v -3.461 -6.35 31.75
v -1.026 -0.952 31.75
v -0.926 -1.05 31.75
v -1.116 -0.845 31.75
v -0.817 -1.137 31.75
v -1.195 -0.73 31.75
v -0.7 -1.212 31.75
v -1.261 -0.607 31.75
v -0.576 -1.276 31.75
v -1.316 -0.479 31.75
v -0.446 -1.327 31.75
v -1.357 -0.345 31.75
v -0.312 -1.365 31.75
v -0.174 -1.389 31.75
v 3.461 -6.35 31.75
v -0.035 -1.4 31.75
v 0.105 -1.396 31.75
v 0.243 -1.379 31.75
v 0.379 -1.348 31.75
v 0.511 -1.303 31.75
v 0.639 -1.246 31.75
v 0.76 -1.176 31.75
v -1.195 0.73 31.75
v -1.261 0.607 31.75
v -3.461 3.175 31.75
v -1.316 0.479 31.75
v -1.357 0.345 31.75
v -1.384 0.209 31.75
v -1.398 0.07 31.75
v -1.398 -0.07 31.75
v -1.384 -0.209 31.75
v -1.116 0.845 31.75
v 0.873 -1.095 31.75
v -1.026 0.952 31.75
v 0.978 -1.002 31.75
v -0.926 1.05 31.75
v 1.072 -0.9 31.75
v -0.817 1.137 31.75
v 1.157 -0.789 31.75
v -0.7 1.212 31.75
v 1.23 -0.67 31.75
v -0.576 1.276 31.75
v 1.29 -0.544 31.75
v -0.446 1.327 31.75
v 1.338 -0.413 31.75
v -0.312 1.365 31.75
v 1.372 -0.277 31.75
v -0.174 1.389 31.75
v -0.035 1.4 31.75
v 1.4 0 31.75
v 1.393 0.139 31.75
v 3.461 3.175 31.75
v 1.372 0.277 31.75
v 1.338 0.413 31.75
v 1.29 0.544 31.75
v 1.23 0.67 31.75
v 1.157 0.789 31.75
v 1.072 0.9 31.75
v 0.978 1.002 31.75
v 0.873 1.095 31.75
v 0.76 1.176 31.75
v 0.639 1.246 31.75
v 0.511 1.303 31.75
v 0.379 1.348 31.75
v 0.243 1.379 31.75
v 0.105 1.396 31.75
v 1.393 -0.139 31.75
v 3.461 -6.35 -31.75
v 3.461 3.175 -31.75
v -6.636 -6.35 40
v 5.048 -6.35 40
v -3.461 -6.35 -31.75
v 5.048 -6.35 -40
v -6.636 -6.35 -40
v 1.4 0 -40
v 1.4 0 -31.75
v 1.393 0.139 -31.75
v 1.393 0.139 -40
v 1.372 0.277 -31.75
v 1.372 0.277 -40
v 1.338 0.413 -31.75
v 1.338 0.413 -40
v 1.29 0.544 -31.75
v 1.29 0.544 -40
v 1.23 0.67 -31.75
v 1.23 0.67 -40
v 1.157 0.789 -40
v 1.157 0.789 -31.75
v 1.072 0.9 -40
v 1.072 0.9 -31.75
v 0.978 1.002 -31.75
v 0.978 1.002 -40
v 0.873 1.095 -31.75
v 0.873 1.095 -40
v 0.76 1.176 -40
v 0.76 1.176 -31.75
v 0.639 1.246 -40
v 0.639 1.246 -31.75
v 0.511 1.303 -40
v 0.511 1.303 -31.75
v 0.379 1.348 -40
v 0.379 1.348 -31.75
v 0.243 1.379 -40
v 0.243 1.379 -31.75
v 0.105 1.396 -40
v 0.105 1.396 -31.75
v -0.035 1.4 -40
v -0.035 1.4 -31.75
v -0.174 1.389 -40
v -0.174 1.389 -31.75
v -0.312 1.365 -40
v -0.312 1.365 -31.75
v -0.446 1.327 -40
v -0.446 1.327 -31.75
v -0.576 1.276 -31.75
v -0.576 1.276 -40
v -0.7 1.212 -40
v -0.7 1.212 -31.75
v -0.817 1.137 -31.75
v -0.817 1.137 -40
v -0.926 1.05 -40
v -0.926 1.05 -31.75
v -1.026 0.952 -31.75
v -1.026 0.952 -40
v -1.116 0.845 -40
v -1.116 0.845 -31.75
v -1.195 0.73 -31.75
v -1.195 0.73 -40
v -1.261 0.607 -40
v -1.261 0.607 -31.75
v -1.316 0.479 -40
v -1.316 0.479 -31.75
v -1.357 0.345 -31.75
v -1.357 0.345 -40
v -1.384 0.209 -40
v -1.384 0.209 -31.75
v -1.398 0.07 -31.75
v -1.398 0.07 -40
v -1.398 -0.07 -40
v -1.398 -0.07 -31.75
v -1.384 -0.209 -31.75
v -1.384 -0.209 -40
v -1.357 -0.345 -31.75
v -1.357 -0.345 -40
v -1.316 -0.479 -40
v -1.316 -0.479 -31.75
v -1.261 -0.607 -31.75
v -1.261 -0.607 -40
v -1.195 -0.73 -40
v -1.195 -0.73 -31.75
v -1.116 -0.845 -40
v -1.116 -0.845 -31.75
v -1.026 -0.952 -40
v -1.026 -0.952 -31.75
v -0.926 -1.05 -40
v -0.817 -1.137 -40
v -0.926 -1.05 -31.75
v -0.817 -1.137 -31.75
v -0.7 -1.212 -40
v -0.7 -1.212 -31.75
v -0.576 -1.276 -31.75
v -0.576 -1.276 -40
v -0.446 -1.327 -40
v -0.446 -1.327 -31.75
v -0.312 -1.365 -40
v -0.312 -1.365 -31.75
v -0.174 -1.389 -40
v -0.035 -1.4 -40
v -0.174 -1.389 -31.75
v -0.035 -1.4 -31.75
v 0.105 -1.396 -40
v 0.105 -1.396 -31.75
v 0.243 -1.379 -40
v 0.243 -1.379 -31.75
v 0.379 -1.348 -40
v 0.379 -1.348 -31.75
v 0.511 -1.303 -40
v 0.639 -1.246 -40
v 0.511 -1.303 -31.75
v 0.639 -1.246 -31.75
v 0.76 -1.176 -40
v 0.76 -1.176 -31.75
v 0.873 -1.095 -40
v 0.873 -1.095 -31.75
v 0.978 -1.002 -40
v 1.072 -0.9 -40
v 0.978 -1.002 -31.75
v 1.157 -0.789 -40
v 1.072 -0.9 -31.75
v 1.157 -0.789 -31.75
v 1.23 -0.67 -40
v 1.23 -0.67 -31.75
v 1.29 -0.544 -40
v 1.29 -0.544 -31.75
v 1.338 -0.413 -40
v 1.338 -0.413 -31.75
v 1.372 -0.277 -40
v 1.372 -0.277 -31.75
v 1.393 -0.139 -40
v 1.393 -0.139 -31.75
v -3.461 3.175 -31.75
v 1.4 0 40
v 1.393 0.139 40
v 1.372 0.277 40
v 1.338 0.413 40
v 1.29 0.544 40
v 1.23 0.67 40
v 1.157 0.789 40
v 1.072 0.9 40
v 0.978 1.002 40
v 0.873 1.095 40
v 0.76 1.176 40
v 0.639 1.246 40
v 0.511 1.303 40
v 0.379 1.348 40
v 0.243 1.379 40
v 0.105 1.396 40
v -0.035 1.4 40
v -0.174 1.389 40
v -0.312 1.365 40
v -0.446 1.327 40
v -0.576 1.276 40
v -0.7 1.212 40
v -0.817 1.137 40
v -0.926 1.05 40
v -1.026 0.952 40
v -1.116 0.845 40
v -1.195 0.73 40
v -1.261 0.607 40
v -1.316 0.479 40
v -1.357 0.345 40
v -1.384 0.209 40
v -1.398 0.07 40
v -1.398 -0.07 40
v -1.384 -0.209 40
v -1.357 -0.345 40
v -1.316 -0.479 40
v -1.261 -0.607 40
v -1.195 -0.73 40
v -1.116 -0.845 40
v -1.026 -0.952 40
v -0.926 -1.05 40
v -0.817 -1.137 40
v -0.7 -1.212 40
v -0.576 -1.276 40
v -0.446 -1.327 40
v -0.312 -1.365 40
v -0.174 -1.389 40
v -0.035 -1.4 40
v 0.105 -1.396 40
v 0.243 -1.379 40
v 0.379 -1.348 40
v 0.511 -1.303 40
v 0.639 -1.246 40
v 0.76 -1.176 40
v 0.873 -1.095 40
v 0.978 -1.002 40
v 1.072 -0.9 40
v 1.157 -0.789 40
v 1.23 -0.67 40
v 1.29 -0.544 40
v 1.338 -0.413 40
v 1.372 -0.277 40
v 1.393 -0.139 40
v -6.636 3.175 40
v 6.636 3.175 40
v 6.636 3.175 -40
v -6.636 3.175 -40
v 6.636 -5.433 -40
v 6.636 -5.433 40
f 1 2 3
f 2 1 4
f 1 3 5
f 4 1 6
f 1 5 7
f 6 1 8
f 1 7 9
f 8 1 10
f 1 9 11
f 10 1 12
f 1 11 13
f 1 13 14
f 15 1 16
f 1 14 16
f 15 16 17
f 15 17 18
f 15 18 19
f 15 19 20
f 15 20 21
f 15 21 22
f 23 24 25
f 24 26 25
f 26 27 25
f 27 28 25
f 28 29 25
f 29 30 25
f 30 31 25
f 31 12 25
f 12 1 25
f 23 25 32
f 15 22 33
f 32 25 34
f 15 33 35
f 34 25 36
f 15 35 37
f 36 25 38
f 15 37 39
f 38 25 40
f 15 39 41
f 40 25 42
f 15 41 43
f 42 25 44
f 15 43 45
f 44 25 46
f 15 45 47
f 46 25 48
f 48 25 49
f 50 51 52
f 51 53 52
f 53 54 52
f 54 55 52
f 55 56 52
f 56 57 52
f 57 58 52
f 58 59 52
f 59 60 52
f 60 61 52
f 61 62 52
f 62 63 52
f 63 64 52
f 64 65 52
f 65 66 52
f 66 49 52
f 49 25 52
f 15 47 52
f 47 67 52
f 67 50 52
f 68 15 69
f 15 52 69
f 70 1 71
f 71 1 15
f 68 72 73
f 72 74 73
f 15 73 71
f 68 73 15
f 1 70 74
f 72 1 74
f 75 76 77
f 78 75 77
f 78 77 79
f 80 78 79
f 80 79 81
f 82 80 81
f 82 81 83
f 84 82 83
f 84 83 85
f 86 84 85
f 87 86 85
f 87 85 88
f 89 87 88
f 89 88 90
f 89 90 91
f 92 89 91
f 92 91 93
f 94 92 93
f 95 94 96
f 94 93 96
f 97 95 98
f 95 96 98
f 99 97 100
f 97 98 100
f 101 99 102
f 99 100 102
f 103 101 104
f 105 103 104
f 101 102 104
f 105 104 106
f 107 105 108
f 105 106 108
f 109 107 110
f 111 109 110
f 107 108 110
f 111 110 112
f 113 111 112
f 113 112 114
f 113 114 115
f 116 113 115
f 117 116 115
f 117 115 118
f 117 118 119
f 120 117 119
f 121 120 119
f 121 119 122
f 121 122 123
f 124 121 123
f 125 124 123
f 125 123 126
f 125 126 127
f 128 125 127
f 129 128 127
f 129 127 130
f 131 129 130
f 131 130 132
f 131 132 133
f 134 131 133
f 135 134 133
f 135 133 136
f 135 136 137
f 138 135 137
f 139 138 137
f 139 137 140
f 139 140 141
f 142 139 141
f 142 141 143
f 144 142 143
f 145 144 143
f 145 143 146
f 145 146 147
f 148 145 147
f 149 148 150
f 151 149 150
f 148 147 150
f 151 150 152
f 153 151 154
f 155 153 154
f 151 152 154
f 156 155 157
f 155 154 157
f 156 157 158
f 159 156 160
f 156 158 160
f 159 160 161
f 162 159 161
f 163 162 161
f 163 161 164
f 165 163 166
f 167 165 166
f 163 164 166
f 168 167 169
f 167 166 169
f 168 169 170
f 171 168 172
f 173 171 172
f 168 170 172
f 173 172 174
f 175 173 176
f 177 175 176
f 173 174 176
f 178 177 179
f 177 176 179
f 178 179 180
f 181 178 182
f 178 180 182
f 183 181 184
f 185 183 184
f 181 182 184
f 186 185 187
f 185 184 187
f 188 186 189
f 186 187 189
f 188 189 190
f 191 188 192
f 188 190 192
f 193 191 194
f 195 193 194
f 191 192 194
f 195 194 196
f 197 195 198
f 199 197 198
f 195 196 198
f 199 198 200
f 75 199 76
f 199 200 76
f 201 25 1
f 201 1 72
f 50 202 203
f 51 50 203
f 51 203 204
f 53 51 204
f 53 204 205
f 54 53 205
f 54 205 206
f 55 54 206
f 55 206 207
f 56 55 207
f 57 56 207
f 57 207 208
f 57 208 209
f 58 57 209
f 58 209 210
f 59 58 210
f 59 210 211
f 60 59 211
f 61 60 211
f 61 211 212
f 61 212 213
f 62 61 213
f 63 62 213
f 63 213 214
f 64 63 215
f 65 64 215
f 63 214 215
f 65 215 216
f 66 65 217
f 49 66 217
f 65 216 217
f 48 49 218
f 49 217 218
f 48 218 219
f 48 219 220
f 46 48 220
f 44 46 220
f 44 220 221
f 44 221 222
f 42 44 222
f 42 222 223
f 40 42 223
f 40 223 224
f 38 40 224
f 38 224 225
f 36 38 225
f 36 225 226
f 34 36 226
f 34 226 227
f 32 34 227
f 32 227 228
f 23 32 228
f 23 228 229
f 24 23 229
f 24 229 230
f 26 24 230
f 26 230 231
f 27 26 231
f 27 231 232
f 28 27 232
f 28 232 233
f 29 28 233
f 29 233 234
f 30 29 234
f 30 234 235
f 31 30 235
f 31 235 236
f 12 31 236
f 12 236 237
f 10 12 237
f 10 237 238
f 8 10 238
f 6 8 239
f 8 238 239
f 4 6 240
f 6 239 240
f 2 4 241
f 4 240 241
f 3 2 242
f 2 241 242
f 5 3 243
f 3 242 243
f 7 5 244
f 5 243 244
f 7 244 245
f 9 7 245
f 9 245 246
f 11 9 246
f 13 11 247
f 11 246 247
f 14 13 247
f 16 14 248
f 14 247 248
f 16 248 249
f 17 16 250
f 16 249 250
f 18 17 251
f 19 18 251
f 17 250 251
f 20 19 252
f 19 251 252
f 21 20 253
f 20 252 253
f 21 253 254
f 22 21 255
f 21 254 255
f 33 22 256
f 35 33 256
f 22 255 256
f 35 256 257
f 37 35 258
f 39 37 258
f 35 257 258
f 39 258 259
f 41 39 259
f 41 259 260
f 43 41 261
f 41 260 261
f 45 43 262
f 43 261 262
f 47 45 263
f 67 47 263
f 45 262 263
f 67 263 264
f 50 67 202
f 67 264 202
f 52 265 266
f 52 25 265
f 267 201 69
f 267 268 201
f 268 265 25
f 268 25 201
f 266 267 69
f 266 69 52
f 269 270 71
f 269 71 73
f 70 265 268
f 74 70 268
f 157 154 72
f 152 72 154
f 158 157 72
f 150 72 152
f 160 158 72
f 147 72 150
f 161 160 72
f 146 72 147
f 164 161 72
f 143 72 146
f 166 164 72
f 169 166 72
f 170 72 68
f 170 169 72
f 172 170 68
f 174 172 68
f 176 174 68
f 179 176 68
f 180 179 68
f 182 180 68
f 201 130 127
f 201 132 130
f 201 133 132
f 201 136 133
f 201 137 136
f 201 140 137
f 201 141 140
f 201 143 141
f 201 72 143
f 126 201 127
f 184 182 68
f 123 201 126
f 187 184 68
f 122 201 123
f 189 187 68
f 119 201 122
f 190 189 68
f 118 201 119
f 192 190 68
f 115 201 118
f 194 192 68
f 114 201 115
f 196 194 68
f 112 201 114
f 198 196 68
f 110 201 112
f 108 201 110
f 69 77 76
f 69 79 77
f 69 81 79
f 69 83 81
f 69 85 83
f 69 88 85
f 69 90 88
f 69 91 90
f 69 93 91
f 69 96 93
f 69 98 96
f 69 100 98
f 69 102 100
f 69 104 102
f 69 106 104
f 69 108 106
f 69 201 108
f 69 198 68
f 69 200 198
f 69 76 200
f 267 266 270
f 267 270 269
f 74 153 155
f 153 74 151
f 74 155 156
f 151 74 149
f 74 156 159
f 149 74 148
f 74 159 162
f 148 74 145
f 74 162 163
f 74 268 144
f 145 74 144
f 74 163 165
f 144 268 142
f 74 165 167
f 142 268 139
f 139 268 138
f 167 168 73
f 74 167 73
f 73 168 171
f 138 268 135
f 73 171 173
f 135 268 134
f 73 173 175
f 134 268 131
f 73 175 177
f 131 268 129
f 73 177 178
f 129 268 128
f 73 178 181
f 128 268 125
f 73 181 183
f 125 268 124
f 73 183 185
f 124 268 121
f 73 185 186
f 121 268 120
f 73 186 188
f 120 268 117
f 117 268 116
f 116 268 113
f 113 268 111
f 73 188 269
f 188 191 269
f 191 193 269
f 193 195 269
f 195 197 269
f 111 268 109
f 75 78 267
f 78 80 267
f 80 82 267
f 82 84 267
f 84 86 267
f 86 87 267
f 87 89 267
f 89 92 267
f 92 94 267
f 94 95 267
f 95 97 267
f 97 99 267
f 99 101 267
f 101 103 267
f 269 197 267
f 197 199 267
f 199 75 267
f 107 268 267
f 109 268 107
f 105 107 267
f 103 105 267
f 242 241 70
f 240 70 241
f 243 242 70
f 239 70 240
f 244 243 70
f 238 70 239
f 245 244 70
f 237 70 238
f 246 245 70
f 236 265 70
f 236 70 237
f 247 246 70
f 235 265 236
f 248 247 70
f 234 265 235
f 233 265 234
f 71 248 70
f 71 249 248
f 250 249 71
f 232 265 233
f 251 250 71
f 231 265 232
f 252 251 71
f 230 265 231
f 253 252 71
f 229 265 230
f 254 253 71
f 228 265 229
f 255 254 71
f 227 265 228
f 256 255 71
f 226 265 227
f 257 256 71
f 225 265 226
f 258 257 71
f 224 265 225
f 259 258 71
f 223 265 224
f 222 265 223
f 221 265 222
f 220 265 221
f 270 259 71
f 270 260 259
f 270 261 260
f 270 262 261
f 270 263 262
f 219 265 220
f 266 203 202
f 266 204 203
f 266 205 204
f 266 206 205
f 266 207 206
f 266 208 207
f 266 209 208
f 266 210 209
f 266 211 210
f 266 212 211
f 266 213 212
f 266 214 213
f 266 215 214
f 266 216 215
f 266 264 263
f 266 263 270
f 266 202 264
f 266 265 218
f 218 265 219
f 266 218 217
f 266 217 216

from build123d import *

# Parameters (mm, degrees)
SKETCH1_W                = 13.2715
SKETCH1_H                = 80.00000002
SKETCH1_W_2              = 6.9215
SKETCH1_H_2              = 63.5
BOSS_EXTRUDE1_DEPTH      = 3.175
BOSS_EXTRUDE1_DEPTH_BACK = 6.35
SKETCH4_R                = 1.399999994
CUT_EXTRUDE1_DEPTH       = 81.00000002
CHAMFER1_SIZE            = 1.5875
CHAMFER1_SIZE2           = 0.916543552


with BuildPart() as part:
    # Sketch1 → Boss-Extrude1 (new body, two sides)
    with BuildSketch(Plane(origin=(0, 0, 0), x_dir=(1, 0, 0), z_dir=(0, 1, 0))) as boss_extrude1_sk:
        Rectangle(SKETCH1_W, SKETCH1_H)
        Rectangle(SKETCH1_W_2, SKETCH1_H_2, mode=Mode.SUBTRACT)
    extrude(amount=BOSS_EXTRUDE1_DEPTH)
    extrude(boss_extrude1_sk.sketch, amount=-BOSS_EXTRUDE1_DEPTH_BACK)

    # Sketch4 → Cut-Extrude1 (cut, through all)
    with BuildSketch(Plane.XY.offset(40.00000001)):
        Circle(SKETCH4_R)
    extrude(amount=-CUT_EXTRUDE1_DEPTH, mode=Mode.SUBTRACT)

    # Chamfer1
    chamfer1_edges = [part.edges().sort_by_distance(p)[0] for p in [
        (6.63575, -6.35, 0),
    ]]
    chamfer1_side = [part.faces().sort_by_distance(p)[0] for p in [
        (0, -6.35, 39.18906643),
    ]]
    chamfer(chamfer1_edges, length=CHAMFER1_SIZE, length2=CHAMFER1_SIZE2, reference=chamfer1_side[0])


solid = part.part
